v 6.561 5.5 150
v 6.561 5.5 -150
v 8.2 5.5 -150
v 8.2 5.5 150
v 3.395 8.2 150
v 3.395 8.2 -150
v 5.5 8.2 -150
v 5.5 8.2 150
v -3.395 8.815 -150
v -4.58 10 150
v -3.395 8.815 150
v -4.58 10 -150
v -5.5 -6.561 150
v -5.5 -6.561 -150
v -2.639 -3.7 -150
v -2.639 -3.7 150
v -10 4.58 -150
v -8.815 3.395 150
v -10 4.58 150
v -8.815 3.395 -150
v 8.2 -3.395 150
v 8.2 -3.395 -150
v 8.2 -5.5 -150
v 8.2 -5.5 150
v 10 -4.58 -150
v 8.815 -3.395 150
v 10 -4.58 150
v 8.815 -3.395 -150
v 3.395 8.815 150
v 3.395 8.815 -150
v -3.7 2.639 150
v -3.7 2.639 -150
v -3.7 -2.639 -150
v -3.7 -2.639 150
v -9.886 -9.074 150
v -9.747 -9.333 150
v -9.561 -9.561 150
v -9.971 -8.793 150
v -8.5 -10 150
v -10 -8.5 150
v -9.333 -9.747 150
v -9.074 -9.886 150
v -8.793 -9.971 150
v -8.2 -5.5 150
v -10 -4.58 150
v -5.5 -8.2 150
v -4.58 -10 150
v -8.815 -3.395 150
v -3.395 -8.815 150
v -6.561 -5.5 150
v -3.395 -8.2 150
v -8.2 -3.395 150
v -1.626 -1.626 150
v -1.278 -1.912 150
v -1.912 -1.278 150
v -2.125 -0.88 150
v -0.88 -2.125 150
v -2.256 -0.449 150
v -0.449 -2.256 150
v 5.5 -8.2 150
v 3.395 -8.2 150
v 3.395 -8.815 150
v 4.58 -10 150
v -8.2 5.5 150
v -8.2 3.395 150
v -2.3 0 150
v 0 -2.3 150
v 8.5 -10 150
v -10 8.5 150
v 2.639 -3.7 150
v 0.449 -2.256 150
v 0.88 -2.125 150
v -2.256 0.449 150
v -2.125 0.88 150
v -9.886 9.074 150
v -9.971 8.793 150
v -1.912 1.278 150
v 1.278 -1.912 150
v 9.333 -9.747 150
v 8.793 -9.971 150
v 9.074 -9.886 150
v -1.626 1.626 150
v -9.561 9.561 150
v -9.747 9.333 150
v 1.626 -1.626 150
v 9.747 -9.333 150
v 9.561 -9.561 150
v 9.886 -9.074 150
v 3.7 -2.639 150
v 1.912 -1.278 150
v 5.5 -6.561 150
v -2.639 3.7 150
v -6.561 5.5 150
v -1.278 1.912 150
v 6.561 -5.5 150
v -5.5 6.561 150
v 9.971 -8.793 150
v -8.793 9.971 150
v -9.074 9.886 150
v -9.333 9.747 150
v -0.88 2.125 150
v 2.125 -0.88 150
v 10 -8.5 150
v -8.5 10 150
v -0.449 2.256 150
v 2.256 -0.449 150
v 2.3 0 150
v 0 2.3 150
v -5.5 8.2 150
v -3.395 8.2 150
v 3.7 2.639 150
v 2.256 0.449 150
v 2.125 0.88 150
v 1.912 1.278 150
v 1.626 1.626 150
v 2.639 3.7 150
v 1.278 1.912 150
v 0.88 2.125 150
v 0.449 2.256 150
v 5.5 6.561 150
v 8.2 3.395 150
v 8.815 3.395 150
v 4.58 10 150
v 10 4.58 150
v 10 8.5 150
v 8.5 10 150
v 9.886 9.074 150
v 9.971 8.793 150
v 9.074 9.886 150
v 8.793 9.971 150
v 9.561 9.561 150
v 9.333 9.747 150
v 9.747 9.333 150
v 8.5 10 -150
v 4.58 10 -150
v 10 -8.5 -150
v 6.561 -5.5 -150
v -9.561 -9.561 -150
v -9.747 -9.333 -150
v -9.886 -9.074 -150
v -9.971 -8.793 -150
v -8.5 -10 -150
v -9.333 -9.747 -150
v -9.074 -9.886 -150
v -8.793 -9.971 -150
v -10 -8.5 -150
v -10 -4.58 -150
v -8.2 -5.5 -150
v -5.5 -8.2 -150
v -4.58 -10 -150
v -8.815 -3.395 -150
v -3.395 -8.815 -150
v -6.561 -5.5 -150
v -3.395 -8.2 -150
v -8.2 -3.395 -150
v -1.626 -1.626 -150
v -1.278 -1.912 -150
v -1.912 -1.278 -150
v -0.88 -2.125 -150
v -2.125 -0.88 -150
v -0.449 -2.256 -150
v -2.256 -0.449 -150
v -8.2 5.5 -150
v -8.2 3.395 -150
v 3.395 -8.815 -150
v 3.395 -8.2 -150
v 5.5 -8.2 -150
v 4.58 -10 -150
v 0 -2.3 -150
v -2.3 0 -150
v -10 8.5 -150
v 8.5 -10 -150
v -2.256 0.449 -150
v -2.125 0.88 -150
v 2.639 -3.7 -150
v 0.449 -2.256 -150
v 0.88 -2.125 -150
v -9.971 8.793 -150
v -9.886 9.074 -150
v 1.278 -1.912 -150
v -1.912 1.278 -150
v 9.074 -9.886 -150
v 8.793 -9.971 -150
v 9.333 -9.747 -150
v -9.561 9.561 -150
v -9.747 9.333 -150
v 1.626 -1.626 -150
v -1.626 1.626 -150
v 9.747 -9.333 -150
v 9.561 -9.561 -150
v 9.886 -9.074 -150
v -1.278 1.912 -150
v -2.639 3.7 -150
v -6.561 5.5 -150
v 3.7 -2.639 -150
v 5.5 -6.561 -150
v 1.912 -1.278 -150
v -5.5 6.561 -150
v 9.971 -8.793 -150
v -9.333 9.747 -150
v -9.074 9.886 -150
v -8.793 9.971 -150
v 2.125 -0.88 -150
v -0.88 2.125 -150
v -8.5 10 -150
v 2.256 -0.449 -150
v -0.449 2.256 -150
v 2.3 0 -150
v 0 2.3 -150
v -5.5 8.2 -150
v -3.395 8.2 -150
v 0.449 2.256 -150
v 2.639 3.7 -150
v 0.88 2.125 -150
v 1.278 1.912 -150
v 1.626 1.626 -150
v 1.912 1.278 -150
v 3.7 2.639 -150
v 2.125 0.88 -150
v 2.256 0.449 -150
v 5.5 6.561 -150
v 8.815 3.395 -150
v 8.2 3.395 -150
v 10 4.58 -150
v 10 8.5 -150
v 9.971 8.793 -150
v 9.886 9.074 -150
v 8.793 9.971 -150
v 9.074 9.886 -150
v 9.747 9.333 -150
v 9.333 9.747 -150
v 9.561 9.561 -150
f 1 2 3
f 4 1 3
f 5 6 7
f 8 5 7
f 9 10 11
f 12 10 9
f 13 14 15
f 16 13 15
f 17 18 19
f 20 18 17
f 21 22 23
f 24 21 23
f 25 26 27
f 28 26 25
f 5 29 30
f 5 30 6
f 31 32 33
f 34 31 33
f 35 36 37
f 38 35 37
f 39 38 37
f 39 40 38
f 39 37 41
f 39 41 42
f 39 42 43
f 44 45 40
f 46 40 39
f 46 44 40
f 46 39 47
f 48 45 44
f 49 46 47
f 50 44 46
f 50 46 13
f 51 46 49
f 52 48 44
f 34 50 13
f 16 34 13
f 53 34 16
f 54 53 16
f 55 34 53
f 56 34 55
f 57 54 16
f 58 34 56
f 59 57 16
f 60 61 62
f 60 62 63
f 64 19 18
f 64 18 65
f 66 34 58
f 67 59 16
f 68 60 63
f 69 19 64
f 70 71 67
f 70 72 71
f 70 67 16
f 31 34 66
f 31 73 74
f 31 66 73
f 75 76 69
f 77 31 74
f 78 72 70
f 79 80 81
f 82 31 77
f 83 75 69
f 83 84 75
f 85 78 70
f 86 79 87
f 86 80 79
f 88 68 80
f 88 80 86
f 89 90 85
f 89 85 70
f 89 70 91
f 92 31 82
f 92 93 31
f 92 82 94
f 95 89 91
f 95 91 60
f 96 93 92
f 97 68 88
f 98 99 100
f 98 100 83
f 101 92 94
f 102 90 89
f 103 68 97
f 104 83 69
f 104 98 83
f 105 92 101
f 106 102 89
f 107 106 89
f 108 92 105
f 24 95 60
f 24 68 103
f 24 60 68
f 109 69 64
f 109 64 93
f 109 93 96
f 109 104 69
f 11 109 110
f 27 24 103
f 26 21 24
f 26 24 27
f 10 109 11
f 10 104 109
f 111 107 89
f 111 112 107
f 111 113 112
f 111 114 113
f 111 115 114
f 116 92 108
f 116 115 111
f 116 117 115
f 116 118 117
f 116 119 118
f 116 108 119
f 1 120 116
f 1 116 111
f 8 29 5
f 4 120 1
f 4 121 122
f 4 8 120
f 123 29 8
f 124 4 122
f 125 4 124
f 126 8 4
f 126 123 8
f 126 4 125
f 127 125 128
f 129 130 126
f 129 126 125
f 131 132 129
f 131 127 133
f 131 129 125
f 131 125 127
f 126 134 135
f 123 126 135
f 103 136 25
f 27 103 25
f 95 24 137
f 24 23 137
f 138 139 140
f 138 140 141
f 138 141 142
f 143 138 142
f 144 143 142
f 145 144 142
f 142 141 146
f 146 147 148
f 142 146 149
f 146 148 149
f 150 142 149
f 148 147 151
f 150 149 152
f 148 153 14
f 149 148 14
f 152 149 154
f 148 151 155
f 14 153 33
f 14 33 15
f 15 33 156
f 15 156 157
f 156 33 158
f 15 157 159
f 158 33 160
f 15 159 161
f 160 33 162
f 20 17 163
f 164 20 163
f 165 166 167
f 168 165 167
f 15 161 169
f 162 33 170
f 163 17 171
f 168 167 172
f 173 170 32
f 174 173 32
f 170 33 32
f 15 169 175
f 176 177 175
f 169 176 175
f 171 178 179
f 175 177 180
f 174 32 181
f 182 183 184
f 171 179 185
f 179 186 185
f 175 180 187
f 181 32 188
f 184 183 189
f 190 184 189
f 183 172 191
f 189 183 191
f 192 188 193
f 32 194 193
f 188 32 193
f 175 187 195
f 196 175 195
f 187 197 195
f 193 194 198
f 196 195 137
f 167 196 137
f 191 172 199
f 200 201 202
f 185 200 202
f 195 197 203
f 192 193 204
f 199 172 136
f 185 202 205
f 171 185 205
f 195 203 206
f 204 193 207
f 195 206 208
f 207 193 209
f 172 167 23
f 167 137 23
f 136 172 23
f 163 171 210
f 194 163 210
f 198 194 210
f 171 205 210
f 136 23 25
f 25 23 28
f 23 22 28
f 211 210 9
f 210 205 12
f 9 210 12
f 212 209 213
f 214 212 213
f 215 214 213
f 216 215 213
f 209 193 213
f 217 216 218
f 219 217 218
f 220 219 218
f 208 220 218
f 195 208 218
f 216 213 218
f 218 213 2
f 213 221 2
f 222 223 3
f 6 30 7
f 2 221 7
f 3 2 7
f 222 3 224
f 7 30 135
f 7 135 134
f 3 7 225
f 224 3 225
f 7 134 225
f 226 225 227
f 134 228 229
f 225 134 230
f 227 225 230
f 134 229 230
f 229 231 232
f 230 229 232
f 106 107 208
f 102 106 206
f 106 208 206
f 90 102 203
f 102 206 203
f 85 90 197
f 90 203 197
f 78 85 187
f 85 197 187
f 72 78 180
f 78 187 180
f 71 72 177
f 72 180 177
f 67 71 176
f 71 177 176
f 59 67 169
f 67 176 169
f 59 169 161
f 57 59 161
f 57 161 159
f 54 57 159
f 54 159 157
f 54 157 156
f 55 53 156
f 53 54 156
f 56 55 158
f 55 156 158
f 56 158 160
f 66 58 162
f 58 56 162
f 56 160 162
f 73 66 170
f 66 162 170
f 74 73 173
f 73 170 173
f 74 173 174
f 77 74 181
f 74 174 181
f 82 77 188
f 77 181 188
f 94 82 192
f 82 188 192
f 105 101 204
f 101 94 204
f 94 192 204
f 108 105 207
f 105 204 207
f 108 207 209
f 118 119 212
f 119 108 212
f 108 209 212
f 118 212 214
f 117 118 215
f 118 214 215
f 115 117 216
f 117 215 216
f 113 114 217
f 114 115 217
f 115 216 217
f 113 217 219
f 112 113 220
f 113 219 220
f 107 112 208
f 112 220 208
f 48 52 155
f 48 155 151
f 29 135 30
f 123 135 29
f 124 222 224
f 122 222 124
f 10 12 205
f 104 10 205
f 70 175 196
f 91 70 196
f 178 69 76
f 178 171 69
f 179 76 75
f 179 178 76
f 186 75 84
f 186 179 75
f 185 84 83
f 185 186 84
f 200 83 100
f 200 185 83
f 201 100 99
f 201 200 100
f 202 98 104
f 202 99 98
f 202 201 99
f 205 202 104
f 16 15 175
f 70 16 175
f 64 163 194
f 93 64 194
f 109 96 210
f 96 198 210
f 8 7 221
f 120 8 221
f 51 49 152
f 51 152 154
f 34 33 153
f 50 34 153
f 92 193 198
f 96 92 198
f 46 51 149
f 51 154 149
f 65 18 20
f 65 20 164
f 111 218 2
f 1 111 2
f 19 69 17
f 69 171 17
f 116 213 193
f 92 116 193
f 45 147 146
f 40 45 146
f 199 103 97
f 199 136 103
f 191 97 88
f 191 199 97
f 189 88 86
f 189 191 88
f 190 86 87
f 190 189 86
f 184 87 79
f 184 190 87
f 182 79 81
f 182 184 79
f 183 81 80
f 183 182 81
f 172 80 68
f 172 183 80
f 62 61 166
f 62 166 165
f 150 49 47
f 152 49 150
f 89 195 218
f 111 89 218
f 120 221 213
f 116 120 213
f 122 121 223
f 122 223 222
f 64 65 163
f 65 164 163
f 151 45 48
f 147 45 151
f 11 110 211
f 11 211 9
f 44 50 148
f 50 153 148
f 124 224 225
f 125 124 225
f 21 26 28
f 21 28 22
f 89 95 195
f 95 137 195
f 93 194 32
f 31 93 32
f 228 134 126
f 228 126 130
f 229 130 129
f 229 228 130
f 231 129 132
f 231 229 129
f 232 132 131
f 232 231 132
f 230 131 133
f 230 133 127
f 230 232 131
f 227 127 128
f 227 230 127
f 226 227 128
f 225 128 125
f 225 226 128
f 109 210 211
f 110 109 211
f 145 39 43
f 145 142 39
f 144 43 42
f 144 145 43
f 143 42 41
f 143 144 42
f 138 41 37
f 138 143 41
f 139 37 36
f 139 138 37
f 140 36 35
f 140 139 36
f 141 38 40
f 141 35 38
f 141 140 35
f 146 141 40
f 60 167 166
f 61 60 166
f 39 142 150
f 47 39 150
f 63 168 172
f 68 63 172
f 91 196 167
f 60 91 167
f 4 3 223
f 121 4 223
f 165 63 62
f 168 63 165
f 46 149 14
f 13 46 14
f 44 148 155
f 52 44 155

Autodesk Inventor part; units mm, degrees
ref_plane "YZ Plane" through (0, 0, 0) normal (1, 0, 0) x (0, 1, 0)
ref_plane "XZ Plane" through (0, 0, 0) normal (0, 1, 0) x (-1, 0, 0)
ref_plane "XY Plane" through (0, 0, 0) normal (0, 0, 1) x (1, 0, 0)
sketch "Sketch1" plane through (0, 0, 0) normal (0, 0, 1) x (1, 0, 0)
  line L0 (0, 3.7) -> (-2.6393, 3.7)
  line L1 (-2.6393, 3.7) -> (-5.5, 6.5607)
  line L2 (-5.5, 6.5607) -> (-5.5, 8.2)
  line L3 (-5.5, 8.2) -> (-3.395, 8.2)
  line L4 (-3.395, 8.2) -> (-3.395, 10)
  line L5 (-3.395, 10) -> (-10, 10)
  line L6 (-10, 10) -> (-10, 3.395)
  line L7 (-10, 3.395) -> (-8.2, 3.395)
  line L8 (-8.2, 3.395) -> (-8.2, 5.5)
  line L9 (-8.2, 5.5) -> (-6.5607, 5.5)
  line L10 (-6.5607, 5.5) -> (-3.7, 2.6393)
  line L11 (-3.7, 2.6393) -> (-3.7, 0)
  line L12 (0, 0) -> (-10, 10) construction
  circle A0 centre (0, 0) radius 2.3
  line L13 (-12.46, 0) -> (4.76, 0) projected
  line L14 (-3.7, 0) -> (0, 0)
  line L15 (0, 0) -> (0, 3.7)
  point P0 (-2.3, 0)
  point P1 (0, 2.3)
  dimension "d0" = 1.5
  dimension "d6" = 6.3
  dimension "d9" = 4.6
  dimension "d18" = 135
  dimension "d22" = 20
  dimension "d34" = 11
  dimension "d35" = 6.79
  dimension "d36" = 1.8
extrude "Extrusion1" add sketch "Sketch1" along normal mid plane 300 contours L15 A0 L13 L11 L10 L9 L8 L7 L6 L5 L4 L3 L2 L1 L0
pattern_circular "Circular Pattern1" count 4 over 360 about axis through (0, 0, -10) along (0, 0, 1) of "Extrusion1"
chamfer "Chamfer1" distance 1.185 angle 45 8 edges at (-3.395, 10, 0) (3.395, 10, 0) (10, 3.395, 0) (10, -3.395, 0) (3.395, -10, 0) (-3.395, -10, 0) (-10, -3.395, 0) (-10, 3.395, 0)
fillet "Fillet1" radius 1.5 4 edges at (-10, 10, 0) (10, 10, 0) (-10, -10, 0) (10, -10, 0)
properties part number "2020aluminum_extrusion_silver" material "Aluminum 6061"
